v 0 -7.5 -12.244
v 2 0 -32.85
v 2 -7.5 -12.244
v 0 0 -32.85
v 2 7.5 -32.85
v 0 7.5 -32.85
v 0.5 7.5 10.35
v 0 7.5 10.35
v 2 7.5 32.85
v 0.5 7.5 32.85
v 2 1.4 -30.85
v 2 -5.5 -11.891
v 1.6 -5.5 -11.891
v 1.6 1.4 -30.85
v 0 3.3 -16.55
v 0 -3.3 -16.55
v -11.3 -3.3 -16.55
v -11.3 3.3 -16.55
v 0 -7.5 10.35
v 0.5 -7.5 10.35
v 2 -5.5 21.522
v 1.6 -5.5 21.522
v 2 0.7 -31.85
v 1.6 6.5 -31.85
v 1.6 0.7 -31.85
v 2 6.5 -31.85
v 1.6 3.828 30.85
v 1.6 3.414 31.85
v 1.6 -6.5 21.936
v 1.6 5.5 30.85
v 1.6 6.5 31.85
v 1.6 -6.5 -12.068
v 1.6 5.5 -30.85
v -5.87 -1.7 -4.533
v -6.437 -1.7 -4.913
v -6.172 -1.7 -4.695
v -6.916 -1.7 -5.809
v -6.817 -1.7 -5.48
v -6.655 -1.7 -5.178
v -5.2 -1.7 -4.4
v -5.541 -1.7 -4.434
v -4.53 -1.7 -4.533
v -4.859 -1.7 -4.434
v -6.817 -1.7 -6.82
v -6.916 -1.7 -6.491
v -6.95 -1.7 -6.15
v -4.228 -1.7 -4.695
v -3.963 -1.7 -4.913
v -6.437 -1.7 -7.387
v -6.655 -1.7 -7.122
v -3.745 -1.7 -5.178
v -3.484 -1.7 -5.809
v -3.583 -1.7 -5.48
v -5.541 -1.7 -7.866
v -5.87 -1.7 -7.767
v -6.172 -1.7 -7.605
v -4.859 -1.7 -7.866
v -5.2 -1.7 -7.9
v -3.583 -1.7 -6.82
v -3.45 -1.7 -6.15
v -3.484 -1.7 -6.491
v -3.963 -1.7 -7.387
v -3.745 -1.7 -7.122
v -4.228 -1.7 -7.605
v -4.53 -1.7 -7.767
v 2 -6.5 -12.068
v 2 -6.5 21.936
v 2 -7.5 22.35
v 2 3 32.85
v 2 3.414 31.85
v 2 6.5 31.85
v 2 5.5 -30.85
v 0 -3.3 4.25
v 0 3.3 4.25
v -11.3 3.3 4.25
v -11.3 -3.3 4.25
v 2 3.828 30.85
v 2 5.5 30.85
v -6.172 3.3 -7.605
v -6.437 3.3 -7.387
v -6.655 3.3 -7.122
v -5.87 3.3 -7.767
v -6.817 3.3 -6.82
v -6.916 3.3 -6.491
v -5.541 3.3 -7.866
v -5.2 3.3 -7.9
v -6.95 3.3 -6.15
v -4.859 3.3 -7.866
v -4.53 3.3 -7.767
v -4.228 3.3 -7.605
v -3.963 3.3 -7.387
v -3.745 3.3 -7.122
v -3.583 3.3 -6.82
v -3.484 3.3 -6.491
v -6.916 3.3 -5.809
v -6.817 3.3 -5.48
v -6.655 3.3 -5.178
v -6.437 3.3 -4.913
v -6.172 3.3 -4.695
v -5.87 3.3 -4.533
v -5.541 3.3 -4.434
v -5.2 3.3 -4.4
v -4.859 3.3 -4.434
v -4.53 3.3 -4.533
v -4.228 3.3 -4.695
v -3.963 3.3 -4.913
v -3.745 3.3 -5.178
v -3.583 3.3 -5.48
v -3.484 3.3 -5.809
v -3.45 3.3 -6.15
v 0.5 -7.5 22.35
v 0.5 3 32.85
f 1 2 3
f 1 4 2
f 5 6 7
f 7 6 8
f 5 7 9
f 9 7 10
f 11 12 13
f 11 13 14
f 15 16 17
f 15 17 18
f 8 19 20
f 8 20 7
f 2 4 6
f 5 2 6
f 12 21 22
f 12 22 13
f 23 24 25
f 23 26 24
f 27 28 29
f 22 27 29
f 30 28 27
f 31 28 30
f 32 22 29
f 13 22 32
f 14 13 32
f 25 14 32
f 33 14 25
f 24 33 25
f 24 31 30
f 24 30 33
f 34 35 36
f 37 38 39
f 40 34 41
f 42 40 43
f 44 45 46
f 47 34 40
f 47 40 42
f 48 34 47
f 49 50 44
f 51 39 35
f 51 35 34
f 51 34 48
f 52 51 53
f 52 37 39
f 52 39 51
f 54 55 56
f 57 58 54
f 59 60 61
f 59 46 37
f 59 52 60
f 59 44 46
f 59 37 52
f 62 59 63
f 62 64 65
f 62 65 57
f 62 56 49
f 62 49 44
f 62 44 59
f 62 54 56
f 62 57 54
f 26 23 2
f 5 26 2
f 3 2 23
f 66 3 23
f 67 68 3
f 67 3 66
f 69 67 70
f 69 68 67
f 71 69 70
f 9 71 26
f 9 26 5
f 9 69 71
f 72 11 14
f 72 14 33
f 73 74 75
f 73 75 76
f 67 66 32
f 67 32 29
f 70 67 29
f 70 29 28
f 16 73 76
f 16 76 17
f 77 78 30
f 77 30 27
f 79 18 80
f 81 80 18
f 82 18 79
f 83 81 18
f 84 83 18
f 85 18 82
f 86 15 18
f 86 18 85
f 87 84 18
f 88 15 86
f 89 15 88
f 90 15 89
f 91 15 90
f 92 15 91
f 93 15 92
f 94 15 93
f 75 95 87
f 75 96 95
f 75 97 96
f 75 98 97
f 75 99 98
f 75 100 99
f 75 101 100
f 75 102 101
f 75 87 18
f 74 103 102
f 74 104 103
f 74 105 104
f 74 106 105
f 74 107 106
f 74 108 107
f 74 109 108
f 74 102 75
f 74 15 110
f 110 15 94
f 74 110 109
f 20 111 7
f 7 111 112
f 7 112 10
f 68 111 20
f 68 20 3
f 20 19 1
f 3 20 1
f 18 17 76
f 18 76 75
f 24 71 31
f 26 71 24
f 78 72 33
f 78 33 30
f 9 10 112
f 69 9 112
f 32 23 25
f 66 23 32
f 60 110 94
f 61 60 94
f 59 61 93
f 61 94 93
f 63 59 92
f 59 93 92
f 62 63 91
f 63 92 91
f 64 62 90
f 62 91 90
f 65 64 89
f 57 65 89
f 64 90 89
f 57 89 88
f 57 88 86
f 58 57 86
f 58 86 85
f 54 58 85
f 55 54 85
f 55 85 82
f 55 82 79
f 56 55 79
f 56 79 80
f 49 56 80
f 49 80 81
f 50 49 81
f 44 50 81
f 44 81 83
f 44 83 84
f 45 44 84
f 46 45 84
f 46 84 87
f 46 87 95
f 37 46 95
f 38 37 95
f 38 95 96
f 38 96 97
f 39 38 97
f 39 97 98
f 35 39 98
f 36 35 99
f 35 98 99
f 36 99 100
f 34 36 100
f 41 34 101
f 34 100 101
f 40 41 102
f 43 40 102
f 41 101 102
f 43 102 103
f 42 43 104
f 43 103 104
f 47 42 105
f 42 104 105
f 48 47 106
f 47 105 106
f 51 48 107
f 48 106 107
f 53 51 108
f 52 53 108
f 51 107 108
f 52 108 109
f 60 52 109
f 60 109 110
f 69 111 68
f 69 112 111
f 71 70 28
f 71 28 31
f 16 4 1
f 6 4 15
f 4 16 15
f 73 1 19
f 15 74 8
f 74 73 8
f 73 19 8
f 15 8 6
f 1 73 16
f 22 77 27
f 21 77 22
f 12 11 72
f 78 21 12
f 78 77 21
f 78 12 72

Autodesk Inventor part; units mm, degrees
ref_plane "YZ Plane" through (0, 0, 0) normal (1, 0, 0) x (0, 1, 0)
ref_plane "XZ Plane" through (0, 0, 0) normal (0, 1, 0) x (-1, 0, 0)
ref_plane "XY Plane" through (0, 0, 0) normal (0, 0, 1) x (1, 0, 0)
sketch "Эскиз1" plane through (0, 0, 0) normal (1, 0, 0) x (0, 1, 0)
  line L0 (-7.5, -32.85) -> (7.5, -32.85)
  line L1 (7.5, -32.85) -> (7.5, 32.85)
  line L2 (7.5, 32.85) -> (-7.5, 32.85)
  line L3 (-7.5, 32.85) -> (-7.5, -32.85)
  line L4 (-7.5, -32.85) -> (7.5, 32.85) construction
  line L5 (7.5, -32.85) -> (-7.5, 32.85) construction
  line L6 (0, -32.85) -> (0, -16.55) construction
  line L7 (3.3, 4.25) -> (-3.3, 4.25)
  line L8 (-3.3, 4.25) -> (-3.3, -16.55)
  line L9 (-3.3, -16.55) -> (3.3, -16.55)
  line L10 (3.3, -16.55) -> (3.3, 4.25)
  line L11 (7.5, 32.85) -> (-7.5, 32.85)
  line L12 (-7.5, 32.85) -> (-7.5, 10.35)
  line L13 (-7.5, 10.35) -> (7.5, 10.35)
  line L14 (7.5, 10.35) -> (7.5, 32.85)
  line L15 (0, -32.85) -> (-7.5, -12.2439)
  line L16 (0, -32.85) -> (21.9285, -32.85) construction
  point P0 (0, 0)
  point P1 (7.5, 10.35)
  dimension "d0" = 15
  dimension "d1" = 65.7
  dimension "d2" = 16.3
  dimension "d3" = 6.6
  dimension "d4" = 20.8
  dimension "d5" = 22.5
  dimension "d25" = 110
extrude "Выдавливание1" add sketch "Эскиз1" along normal blind 2 contours L15 L3 L13 L1 L0 | L3 L2 L1 L13 | L10 L9 L8 L7
extrude "Выдавливание2" add sketch "Эскиз1" against normal blind 11.3 contours L10 L9 L8 L7
extrude "Выдавливание3" cut sketch "Эскиз1" along normal blind 0.5 contours L3 L2 L1 L13
chamfer "Фаска2" distance 10.5 angle 45 1 edges at (1.25, -7.5, 32.85)
sketch "Эскиз2" plane through (2, 0, 0) normal (1, 0, 0) x (0, 0, -1)
  line L0 (-22.35, -7.5) -> (-32.85, 3) projected
  line L1 (-22.35, -7.5) -> (12.2439, -7.5) projected
  line L2 (32.85, 0) -> (32.85, 7.5) projected
  line L3 (32.85, 7.5) -> (-32.85, 7.5) projected
  line L4 (-32.85, 7.5) -> (-32.85, 3) projected
  line L5 (12.2439, -7.5) -> (32.85, 0) projected
  line L6 (31.85, 0.7002) -> (12.0676, -6.5)
  line L7 (12.0676, -6.5) -> (-21.9358, -6.5)
  line L8 (-21.9358, -6.5) -> (-31.85, 3.4142)
  line L9 (-31.85, 3.4142) -> (-31.85, 6.5)
  line L10 (-31.85, 6.5) -> (31.85, 6.5)
  line L11 (31.85, 6.5) -> (31.85, 0.7002)
  line L12 (30.85, 5.5) -> (-30.85, 5.5)
  line L13 (-30.85, 5.5) -> (-30.85, 3.8284)
  line L14 (-30.85, 3.8284) -> (-21.5216, -5.5)
  line L15 (-21.5216, -5.5) -> (11.8913, -5.5)
  line L16 (11.8913, -5.5) -> (30.85, 1.4004)
  line L17 (30.85, 1.4004) -> (30.85, 5.5)
  point P0 (0, 0)
  dimension "d26" = 1
  dimension "d32" = 1
extrude "Выдавливание5" cut sketch "Эскиз2" against normal blind 0.4 contours L6 L7 L8 L9 L10 L11
sketch "Эскиз3" plane through (-11.3, 3.3, -16.55) normal (0, 1, 0) x (1, 0, 0)
  line L0 (0, 0) -> (0, -20.8) projected
  line L1 (0, 0) -> (6.1, 0) construction
  line L2 (6.1, 0) -> (6.1, -10.4) construction
  line L3 (6.1, -10.4) -> (0, -10.4) construction
  line L4 (0, -10.4) -> (0, 0) construction
  circle A0 centre (6.1, -10.4) radius 1.75
  point P0 (11.3, -16.55)
  dimension "d27" = 6.1
  dimension "d28" = 10.4
  dimension "d29" = 3.5
extrude "Выдавливание6" cut sketch "Эскиз3" against normal blind 5
properties part number "switch_cap_bl"
